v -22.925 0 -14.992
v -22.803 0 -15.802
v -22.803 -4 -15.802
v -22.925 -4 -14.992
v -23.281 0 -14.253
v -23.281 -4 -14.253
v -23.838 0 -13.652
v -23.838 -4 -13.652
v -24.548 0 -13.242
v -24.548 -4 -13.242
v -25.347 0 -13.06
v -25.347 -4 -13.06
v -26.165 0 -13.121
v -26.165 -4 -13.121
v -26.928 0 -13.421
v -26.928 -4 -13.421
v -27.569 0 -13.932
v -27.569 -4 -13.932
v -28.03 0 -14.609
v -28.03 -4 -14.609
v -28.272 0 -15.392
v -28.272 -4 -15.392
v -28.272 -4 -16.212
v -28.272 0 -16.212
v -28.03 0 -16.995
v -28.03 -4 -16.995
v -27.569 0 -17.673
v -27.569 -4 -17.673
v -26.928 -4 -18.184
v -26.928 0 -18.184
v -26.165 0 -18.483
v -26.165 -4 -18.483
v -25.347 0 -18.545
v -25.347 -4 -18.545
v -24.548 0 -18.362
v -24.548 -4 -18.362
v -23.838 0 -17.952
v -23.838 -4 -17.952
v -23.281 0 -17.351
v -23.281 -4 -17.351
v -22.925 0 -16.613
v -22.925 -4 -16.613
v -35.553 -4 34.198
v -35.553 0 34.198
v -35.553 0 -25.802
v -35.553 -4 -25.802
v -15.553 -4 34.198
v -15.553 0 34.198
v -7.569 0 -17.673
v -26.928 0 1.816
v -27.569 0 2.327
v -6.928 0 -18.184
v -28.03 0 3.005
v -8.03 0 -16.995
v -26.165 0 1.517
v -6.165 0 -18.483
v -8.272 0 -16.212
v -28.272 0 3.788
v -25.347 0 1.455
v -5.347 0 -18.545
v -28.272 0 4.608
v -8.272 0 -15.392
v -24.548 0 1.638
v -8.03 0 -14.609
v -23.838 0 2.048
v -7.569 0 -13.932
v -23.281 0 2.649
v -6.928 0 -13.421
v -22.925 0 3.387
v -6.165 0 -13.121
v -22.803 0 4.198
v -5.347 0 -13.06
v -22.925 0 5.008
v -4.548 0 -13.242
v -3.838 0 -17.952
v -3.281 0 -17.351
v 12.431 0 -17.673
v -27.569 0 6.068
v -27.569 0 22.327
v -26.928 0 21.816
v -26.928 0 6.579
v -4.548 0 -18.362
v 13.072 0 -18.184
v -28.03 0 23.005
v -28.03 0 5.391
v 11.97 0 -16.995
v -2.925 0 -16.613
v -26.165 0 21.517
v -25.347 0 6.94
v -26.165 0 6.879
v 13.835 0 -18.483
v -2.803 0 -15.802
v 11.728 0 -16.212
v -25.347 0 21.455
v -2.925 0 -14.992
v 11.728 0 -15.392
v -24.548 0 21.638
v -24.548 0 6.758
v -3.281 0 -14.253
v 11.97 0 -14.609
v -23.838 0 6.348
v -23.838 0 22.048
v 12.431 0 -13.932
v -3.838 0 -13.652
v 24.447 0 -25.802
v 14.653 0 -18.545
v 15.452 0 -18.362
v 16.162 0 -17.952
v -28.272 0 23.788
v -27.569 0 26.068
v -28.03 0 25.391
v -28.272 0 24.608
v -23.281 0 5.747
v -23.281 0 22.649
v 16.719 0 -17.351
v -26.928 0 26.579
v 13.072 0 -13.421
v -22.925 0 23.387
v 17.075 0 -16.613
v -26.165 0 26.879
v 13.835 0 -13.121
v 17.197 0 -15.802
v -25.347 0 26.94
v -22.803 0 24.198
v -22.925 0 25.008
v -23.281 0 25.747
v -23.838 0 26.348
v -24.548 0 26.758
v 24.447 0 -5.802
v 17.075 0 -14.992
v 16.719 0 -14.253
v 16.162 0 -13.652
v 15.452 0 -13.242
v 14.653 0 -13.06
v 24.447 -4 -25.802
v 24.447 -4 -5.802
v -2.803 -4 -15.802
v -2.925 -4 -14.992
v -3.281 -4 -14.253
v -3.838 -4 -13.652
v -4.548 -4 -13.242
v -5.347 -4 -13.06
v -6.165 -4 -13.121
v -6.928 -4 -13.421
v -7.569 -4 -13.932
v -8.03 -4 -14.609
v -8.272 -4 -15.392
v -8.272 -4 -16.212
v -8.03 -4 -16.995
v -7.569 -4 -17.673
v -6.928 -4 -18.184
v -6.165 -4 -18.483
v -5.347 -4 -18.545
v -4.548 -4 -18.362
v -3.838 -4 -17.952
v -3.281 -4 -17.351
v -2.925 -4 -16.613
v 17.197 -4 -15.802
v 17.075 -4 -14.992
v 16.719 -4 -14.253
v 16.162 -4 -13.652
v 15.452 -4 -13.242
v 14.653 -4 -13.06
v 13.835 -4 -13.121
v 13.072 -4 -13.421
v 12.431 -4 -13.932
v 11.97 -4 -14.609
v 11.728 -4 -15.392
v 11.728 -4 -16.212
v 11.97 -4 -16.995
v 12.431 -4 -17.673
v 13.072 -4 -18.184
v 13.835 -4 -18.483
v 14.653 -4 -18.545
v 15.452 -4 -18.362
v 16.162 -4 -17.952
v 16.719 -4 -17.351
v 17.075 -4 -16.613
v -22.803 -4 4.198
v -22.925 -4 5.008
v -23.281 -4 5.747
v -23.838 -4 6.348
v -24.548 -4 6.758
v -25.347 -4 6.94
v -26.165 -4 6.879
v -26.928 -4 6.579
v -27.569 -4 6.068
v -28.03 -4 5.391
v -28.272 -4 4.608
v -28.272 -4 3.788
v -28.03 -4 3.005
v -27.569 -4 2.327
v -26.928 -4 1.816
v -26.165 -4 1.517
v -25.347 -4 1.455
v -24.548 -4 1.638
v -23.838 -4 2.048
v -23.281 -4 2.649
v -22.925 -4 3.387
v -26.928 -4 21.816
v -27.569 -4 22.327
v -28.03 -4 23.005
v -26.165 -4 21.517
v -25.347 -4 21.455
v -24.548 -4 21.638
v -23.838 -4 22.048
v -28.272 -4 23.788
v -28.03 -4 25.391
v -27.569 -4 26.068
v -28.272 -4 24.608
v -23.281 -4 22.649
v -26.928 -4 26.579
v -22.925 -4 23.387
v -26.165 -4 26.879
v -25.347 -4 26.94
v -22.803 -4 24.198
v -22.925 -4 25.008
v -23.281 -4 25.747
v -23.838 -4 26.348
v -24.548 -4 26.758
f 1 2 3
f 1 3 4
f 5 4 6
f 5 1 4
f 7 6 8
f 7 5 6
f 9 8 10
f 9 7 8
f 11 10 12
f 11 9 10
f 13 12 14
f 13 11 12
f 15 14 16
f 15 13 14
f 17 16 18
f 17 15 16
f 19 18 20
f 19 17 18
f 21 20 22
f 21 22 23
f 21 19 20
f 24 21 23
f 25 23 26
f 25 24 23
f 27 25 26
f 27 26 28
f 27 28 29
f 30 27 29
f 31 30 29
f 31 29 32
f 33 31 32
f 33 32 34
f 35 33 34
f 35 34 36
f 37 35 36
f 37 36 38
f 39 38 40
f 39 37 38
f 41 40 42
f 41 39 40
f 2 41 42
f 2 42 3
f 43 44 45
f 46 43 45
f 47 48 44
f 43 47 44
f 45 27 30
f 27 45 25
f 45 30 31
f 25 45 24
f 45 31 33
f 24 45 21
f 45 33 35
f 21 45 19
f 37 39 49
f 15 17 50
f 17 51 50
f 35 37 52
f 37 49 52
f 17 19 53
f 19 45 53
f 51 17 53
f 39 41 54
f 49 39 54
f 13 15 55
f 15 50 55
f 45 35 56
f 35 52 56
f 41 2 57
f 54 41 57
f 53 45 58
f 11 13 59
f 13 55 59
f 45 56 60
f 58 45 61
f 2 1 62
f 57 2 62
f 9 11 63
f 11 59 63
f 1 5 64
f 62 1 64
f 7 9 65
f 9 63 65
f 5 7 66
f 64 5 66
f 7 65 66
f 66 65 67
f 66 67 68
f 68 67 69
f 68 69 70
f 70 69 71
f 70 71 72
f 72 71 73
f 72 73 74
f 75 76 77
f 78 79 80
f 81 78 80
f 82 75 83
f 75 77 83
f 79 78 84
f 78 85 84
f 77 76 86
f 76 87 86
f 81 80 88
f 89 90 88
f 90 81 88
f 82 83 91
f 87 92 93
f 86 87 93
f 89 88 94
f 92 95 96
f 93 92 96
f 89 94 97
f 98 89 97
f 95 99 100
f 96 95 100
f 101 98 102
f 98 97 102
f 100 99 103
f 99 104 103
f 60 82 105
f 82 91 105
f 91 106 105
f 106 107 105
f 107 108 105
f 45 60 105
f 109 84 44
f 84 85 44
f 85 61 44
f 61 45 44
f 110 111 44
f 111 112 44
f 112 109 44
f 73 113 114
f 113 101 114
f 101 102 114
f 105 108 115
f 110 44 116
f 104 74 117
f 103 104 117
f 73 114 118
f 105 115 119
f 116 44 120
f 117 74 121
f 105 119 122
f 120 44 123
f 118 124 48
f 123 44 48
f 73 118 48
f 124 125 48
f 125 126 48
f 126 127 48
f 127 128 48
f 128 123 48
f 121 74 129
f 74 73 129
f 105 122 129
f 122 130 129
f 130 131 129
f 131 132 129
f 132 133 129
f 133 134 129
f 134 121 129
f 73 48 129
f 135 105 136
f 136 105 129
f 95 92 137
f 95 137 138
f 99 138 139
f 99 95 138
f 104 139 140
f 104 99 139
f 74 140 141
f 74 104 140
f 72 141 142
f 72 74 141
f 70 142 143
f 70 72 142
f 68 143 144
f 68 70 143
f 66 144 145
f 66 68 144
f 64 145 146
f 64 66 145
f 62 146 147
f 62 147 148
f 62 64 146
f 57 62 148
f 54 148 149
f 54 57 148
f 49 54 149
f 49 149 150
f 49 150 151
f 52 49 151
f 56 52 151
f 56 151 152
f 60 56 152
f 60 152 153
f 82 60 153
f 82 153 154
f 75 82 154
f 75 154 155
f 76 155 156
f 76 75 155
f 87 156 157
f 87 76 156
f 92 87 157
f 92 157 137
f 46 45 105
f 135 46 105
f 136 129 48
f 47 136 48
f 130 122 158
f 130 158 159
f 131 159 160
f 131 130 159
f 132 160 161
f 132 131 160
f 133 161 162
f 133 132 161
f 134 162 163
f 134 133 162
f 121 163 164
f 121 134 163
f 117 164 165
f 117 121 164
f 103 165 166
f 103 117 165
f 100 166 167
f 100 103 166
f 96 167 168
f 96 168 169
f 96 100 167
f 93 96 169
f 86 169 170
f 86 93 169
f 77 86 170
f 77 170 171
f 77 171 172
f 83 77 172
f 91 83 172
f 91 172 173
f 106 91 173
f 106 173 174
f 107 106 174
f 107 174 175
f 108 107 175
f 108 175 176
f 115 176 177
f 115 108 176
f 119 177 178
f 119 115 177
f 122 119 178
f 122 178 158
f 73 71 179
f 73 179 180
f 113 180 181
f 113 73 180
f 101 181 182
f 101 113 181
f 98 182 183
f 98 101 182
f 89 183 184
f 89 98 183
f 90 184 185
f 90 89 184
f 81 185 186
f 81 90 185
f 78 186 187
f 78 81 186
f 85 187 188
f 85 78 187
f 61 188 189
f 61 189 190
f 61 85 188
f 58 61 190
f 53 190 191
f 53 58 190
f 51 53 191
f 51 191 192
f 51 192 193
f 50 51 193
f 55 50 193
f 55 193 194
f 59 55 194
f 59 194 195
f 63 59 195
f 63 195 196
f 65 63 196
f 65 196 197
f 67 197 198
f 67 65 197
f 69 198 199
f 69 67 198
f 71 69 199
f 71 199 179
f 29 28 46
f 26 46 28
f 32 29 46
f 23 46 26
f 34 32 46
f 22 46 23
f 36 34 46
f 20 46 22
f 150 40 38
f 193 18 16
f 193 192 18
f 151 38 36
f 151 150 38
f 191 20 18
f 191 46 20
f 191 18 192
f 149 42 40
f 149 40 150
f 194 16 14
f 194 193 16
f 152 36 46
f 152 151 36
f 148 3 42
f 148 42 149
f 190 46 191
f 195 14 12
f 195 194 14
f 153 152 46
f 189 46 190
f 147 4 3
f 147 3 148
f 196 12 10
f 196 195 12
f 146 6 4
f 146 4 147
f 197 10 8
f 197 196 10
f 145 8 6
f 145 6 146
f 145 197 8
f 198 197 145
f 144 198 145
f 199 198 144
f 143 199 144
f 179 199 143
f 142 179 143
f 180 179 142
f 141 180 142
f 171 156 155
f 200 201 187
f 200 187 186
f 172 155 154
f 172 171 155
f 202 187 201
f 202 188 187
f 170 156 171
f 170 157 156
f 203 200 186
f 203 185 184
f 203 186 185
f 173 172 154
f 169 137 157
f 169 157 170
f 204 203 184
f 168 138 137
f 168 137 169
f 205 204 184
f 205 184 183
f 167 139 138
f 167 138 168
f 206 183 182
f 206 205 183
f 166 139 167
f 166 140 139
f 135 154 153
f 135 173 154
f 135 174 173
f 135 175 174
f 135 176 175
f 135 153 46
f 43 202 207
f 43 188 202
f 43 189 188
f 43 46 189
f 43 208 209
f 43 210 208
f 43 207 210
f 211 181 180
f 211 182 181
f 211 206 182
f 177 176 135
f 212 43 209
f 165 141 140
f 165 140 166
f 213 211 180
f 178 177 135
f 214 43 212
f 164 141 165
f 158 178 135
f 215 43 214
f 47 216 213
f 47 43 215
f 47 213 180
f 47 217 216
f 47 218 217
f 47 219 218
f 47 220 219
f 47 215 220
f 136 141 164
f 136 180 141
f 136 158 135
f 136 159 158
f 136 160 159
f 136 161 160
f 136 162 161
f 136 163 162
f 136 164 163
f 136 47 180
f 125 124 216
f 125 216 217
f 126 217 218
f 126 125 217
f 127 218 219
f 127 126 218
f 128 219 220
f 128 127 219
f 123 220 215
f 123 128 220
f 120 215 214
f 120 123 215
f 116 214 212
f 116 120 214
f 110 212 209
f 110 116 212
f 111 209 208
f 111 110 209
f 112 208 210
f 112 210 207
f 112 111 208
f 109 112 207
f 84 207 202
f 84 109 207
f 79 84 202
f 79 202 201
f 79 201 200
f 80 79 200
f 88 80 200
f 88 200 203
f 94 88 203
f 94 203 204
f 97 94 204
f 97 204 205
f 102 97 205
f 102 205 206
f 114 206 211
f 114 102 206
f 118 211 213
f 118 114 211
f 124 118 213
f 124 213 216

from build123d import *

# Parameters (mm, degrees)
F0_R     = 2.75
F1_DEPTH = 4


with BuildPart() as f1:
    # F0 (on Front) → F1 (new body)
    with BuildSketch(Plane.XZ):
        Polygon((-15.552693, 34.197687), (-35.552693, 34.197687), (-35.552693, -25.802313), (24.447307, -25.802313), (24.447307, -5.802313), align=None)
        with Locations((-25.552693, -15.802313)):
            Circle(F0_R, mode=Mode.SUBTRACT)
        with Locations((-5.552693, -15.802313)):
            Circle(F0_R, mode=Mode.SUBTRACT)
        with Locations((-25.552693, 4.197687)):
            Circle(F0_R, mode=Mode.SUBTRACT)
        with Locations((14.447307, -15.802313)):
            Circle(F0_R, mode=Mode.SUBTRACT)
        with Locations((-25.552693, 24.197687)):
            Circle(F0_R, mode=Mode.SUBTRACT)
    extrude(amount=F1_DEPTH)


solid = f1.part
